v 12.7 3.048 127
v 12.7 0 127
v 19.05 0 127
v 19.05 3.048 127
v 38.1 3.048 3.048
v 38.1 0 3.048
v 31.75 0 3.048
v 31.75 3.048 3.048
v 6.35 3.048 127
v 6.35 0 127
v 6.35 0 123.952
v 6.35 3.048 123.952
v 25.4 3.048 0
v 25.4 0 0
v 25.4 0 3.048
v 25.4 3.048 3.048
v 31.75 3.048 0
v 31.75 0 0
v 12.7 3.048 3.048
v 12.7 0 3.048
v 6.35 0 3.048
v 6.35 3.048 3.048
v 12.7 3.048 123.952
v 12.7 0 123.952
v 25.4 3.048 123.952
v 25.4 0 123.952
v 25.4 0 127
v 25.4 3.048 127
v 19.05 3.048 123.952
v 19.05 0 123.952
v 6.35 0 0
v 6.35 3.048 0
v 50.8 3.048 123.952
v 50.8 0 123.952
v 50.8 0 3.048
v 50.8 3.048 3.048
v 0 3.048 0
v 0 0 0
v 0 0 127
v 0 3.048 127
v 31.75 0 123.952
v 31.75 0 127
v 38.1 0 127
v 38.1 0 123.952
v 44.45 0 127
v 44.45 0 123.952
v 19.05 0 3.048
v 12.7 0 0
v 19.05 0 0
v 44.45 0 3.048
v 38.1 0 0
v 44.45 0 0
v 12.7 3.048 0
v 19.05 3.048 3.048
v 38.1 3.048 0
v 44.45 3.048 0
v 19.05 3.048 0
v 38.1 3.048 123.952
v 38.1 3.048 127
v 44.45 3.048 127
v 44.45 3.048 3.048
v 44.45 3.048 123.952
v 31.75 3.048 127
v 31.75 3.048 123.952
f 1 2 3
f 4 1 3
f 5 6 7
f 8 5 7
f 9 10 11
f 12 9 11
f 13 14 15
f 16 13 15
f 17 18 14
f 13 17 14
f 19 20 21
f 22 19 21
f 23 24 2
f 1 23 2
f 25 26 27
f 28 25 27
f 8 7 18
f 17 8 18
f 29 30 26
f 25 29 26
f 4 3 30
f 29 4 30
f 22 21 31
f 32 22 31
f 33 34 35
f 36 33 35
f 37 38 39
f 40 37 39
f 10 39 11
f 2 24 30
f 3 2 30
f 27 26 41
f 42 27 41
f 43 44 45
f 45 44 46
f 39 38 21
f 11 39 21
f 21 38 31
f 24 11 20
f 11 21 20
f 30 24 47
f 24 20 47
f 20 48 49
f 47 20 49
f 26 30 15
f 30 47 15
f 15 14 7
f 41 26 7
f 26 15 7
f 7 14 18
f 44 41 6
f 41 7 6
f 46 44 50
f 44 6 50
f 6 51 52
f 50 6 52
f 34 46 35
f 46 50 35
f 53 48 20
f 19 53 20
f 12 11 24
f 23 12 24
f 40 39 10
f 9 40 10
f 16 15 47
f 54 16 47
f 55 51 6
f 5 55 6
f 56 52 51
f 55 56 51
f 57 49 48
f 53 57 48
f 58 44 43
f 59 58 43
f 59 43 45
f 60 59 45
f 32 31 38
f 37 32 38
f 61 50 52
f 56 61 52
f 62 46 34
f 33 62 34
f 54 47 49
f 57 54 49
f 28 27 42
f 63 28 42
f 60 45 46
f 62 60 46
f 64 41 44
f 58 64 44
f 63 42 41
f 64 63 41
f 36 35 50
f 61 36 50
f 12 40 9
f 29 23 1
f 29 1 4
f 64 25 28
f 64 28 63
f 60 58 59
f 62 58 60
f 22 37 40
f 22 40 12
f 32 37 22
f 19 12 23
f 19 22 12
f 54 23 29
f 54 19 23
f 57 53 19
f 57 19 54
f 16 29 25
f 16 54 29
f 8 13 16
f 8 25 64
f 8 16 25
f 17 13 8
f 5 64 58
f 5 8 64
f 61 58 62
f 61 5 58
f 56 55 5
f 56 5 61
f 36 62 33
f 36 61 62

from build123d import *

# Parameters (mm, degrees)
BOSS_EXTRUDE1_DEPTH = 3.048


with BuildPart() as part:
    # Sketch1 → Boss-Extrude1 (new body)
    with BuildSketch(Plane(origin=(0, 0, 0), x_dir=(1, 0, 0), z_dir=(0, 1, 0))):
        Polygon((6.35, 0), (0, 0), (0, -63.5), (50.8, -63.5), (50.8, -3.048), (44.45, -3.048), (44.45, 0), (38.1, 0), (38.1, -3.048), (31.75, -3.048), (31.75, 0), (25.4, 0), (25.4, -3.048), (19.05, -3.048), (19.05, 0), (12.7, 0), (12.7, -3.048), (6.35, -3.048), align=None)
        Polygon((50.8, -63.5), (0, -63.5), (0, -127), (6.35, -127), (6.35, -123.952), (12.7, -123.952), (12.7, -127), (19.05, -127), (19.05, -123.952), (25.4, -123.952), (25.4, -127), (31.75, -127), (31.75, -123.952), (38.1, -123.952), (38.1, -127), (44.45, -127), (44.45, -123.952), (50.8, -123.952), align=None)
    extrude(amount=BOSS_EXTRUDE1_DEPTH)


solid = part.part
